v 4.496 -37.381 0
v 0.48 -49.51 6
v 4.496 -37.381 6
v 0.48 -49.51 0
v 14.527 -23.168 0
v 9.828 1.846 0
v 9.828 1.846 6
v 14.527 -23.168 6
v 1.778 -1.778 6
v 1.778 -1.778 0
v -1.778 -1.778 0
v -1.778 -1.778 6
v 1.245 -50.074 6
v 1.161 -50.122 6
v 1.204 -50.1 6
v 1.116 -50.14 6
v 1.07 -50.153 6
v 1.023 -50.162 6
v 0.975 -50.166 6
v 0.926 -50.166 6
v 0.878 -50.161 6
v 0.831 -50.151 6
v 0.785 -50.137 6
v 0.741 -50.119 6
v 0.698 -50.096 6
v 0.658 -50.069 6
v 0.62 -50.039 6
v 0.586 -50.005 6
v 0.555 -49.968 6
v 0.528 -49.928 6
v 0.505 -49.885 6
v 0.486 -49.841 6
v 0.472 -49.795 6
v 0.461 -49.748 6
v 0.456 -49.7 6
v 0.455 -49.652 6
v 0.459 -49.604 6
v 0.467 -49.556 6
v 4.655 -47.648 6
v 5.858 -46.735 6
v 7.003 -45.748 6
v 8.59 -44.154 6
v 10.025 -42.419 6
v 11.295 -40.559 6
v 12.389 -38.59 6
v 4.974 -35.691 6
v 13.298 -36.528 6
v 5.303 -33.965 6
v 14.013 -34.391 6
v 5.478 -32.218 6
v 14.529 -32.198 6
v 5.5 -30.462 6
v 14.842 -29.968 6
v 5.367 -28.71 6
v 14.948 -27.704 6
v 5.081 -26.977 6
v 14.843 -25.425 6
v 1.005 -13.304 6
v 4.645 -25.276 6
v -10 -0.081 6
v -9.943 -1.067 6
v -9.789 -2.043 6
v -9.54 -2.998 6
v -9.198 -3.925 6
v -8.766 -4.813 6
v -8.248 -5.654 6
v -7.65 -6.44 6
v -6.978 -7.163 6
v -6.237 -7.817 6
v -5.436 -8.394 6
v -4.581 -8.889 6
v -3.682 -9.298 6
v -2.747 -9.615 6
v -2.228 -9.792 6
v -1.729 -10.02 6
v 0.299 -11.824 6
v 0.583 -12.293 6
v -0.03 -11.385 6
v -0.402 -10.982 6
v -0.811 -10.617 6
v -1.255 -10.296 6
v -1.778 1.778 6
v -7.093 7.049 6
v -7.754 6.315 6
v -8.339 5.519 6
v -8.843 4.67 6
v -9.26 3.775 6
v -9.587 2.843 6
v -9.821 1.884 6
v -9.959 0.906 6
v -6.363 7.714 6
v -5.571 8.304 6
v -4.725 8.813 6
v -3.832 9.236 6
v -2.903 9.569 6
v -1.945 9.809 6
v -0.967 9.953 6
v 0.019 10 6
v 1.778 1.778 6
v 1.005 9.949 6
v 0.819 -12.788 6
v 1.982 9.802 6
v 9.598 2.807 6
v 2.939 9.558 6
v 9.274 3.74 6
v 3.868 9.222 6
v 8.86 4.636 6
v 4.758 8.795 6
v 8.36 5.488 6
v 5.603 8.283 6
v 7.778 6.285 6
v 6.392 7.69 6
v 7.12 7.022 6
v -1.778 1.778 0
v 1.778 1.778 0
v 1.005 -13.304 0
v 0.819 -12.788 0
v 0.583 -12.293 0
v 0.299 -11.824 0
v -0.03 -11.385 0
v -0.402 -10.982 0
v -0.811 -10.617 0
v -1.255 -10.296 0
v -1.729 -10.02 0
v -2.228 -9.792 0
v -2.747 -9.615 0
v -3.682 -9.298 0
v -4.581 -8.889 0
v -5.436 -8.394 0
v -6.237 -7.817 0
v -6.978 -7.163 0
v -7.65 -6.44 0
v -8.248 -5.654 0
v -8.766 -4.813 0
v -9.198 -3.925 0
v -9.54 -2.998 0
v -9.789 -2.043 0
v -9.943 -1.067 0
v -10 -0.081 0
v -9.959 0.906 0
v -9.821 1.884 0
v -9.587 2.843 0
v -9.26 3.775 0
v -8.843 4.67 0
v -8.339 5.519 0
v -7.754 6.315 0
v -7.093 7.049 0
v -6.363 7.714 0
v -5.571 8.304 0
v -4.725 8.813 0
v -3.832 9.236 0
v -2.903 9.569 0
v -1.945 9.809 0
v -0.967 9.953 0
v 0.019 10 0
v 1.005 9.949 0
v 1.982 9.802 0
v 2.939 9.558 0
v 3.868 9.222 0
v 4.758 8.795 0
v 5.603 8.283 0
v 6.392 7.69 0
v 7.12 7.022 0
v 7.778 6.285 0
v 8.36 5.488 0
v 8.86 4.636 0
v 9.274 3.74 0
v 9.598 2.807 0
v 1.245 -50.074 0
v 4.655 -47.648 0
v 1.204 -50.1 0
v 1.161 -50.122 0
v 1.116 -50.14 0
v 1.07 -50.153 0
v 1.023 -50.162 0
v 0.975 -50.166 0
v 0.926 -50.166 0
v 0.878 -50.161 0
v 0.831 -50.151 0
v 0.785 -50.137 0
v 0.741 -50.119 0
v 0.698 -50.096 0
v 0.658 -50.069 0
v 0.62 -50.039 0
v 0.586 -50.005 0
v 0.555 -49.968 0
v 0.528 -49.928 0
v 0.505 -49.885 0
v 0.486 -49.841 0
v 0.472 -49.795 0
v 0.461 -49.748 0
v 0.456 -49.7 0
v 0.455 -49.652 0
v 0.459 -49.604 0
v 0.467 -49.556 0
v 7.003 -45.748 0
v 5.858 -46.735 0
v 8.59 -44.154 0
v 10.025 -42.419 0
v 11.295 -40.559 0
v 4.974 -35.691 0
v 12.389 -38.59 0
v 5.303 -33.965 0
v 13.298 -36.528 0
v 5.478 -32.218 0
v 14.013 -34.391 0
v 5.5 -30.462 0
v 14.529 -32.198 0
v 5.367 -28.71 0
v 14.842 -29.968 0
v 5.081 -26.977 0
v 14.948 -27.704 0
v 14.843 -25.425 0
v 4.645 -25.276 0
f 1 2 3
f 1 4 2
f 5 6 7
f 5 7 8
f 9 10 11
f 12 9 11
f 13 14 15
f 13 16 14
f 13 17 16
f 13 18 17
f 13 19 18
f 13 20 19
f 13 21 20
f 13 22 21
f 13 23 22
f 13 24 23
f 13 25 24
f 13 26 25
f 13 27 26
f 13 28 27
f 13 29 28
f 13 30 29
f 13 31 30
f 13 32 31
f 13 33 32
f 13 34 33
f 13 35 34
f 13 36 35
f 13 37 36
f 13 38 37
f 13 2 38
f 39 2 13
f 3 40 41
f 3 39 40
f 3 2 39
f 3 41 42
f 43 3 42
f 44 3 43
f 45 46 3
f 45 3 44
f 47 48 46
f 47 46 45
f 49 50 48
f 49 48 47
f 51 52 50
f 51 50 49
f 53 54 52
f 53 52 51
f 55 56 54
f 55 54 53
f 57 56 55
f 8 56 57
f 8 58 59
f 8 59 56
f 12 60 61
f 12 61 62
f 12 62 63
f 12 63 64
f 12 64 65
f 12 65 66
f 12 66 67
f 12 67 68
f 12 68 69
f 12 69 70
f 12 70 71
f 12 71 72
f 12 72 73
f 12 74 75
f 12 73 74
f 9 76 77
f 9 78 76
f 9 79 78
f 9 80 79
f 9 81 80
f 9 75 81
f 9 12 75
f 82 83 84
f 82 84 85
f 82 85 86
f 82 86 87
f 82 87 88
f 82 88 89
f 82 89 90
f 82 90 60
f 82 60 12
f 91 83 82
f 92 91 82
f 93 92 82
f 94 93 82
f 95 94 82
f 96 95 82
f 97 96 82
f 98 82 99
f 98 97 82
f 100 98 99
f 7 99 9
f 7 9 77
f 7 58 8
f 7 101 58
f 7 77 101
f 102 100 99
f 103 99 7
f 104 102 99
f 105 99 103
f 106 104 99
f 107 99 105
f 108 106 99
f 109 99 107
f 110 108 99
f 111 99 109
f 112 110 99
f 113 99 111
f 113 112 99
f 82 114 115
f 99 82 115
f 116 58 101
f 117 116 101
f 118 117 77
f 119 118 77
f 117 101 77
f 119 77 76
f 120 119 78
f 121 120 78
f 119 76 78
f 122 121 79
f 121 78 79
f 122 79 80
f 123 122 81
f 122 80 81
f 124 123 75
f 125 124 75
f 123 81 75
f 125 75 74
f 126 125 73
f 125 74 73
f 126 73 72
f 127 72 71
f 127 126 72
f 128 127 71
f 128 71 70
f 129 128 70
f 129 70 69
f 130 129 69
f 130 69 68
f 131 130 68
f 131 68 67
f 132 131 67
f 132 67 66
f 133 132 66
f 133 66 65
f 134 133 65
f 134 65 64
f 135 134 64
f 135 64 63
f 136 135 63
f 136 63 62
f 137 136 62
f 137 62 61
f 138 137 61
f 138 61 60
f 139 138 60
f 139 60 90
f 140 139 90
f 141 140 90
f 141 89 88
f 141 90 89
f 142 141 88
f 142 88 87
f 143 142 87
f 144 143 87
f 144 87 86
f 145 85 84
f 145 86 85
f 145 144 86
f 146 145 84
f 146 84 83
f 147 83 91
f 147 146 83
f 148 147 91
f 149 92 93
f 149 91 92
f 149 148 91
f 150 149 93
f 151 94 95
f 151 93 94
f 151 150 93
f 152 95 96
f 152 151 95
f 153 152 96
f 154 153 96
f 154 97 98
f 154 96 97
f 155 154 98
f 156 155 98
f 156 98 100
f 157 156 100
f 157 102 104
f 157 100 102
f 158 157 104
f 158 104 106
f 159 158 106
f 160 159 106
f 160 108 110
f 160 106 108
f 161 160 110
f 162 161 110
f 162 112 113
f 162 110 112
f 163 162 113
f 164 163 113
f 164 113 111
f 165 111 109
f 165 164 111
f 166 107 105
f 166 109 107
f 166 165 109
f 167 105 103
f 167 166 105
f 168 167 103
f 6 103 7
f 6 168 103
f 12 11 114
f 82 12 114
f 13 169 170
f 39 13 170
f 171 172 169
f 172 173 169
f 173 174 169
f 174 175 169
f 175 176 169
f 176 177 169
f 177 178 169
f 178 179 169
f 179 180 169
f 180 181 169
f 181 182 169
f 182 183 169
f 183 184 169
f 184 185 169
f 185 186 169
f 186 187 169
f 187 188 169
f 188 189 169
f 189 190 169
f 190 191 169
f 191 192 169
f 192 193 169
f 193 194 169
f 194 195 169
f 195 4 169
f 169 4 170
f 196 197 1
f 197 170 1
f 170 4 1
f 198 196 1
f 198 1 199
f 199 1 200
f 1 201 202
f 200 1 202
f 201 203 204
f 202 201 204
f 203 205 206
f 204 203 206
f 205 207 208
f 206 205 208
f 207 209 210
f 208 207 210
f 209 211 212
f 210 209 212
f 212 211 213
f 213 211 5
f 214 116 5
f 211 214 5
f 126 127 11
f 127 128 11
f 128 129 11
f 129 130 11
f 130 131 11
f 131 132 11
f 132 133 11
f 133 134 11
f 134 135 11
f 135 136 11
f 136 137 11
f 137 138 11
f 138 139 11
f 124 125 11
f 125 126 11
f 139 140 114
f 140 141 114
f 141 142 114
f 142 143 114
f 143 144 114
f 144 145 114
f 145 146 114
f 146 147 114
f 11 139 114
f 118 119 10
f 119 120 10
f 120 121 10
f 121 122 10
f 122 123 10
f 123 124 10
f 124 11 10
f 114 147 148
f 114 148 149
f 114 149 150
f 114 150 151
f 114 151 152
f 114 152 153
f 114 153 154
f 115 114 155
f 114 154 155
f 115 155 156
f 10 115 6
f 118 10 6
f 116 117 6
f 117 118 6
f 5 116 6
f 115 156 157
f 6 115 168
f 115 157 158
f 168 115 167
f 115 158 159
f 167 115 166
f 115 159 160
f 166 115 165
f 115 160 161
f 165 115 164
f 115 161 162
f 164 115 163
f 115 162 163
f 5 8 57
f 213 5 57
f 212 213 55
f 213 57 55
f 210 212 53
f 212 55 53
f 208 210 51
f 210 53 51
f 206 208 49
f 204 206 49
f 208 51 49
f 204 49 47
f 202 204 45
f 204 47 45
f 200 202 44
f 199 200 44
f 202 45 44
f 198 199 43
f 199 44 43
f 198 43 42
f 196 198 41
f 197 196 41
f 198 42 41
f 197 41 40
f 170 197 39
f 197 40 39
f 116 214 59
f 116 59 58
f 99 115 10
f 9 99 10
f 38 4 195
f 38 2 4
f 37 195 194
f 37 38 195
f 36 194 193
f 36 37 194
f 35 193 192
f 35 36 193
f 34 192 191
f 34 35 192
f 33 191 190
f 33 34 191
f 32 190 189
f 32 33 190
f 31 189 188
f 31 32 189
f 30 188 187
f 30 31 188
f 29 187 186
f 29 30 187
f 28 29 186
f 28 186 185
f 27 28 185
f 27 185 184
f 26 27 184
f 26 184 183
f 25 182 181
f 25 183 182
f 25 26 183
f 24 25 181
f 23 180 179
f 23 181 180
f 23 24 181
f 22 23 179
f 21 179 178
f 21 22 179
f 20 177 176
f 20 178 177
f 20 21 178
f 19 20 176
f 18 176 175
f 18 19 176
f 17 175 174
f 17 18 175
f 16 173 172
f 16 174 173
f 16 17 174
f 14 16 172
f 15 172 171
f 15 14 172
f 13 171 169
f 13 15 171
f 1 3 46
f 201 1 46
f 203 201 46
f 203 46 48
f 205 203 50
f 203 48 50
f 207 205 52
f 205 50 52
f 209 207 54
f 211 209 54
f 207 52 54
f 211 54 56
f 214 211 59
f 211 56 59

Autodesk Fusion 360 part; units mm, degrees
sketch "Sketch1" plane through (0, 0, 0) normal (0, 0, 1) x (1, 0, 0)
  circle A0 centre (0, 0) radius 10
  line L0 (-1.778, 1.778) -> (1.778, 1.778)
  line L1 (1.778, 1.778) -> (1.778, -1.778)
  line L2 (1.778, -1.778) -> (-1.778, -1.778)
  line L3 (-1.778, -1.778) -> (-1.778, 1.778)
  line L4 (-1.778, 1.778) -> (1.778, -1.778) construction
  line L5 (1.778, 1.778) -> (-1.778, -1.778) construction
  line L6 (0, 10) -> (0, -50.96)
  line L7 (0, -50.96) -> (11.2783, -42.9344)
  line L8 (0, -50.96) -> (6.4922, -31.3521)
  line L9 (9.8281, 1.8461) -> (16.0511, -31.2832)
  line L10 (11.2783, -42.9344) -> (16.0511, -31.2832)
  line L11 (6.4922, -31.3521) -> (0, -10)
  point P0 (-10, 0)
  point P1 (0, 10)
  dimension "d1" = 20
  dimension "d5" = 3.556
  dimension "d14" = 60.96
extrude "Extrude1" add sketch "Sketch1" along normal blind 6 contours A0 L0 L1 L2 L6 | A0 L7 L8 L9 L10 L11 | A0 L0 L2 L3 L6
fillet "Fillet5" radius 24.5 2 edges at (16.0511, -31.2832, 3) (11.2783, -42.9344, 3)
fillet "Fillet6" radius 0.5 1 edges at (0, -50.96, 3)
fillet "Fillet7" radius 20 1 edges at (6.4922, -31.3521, 3)
fillet "Fillet8" radius 5.5 1 edges at (0, -10, 3)
